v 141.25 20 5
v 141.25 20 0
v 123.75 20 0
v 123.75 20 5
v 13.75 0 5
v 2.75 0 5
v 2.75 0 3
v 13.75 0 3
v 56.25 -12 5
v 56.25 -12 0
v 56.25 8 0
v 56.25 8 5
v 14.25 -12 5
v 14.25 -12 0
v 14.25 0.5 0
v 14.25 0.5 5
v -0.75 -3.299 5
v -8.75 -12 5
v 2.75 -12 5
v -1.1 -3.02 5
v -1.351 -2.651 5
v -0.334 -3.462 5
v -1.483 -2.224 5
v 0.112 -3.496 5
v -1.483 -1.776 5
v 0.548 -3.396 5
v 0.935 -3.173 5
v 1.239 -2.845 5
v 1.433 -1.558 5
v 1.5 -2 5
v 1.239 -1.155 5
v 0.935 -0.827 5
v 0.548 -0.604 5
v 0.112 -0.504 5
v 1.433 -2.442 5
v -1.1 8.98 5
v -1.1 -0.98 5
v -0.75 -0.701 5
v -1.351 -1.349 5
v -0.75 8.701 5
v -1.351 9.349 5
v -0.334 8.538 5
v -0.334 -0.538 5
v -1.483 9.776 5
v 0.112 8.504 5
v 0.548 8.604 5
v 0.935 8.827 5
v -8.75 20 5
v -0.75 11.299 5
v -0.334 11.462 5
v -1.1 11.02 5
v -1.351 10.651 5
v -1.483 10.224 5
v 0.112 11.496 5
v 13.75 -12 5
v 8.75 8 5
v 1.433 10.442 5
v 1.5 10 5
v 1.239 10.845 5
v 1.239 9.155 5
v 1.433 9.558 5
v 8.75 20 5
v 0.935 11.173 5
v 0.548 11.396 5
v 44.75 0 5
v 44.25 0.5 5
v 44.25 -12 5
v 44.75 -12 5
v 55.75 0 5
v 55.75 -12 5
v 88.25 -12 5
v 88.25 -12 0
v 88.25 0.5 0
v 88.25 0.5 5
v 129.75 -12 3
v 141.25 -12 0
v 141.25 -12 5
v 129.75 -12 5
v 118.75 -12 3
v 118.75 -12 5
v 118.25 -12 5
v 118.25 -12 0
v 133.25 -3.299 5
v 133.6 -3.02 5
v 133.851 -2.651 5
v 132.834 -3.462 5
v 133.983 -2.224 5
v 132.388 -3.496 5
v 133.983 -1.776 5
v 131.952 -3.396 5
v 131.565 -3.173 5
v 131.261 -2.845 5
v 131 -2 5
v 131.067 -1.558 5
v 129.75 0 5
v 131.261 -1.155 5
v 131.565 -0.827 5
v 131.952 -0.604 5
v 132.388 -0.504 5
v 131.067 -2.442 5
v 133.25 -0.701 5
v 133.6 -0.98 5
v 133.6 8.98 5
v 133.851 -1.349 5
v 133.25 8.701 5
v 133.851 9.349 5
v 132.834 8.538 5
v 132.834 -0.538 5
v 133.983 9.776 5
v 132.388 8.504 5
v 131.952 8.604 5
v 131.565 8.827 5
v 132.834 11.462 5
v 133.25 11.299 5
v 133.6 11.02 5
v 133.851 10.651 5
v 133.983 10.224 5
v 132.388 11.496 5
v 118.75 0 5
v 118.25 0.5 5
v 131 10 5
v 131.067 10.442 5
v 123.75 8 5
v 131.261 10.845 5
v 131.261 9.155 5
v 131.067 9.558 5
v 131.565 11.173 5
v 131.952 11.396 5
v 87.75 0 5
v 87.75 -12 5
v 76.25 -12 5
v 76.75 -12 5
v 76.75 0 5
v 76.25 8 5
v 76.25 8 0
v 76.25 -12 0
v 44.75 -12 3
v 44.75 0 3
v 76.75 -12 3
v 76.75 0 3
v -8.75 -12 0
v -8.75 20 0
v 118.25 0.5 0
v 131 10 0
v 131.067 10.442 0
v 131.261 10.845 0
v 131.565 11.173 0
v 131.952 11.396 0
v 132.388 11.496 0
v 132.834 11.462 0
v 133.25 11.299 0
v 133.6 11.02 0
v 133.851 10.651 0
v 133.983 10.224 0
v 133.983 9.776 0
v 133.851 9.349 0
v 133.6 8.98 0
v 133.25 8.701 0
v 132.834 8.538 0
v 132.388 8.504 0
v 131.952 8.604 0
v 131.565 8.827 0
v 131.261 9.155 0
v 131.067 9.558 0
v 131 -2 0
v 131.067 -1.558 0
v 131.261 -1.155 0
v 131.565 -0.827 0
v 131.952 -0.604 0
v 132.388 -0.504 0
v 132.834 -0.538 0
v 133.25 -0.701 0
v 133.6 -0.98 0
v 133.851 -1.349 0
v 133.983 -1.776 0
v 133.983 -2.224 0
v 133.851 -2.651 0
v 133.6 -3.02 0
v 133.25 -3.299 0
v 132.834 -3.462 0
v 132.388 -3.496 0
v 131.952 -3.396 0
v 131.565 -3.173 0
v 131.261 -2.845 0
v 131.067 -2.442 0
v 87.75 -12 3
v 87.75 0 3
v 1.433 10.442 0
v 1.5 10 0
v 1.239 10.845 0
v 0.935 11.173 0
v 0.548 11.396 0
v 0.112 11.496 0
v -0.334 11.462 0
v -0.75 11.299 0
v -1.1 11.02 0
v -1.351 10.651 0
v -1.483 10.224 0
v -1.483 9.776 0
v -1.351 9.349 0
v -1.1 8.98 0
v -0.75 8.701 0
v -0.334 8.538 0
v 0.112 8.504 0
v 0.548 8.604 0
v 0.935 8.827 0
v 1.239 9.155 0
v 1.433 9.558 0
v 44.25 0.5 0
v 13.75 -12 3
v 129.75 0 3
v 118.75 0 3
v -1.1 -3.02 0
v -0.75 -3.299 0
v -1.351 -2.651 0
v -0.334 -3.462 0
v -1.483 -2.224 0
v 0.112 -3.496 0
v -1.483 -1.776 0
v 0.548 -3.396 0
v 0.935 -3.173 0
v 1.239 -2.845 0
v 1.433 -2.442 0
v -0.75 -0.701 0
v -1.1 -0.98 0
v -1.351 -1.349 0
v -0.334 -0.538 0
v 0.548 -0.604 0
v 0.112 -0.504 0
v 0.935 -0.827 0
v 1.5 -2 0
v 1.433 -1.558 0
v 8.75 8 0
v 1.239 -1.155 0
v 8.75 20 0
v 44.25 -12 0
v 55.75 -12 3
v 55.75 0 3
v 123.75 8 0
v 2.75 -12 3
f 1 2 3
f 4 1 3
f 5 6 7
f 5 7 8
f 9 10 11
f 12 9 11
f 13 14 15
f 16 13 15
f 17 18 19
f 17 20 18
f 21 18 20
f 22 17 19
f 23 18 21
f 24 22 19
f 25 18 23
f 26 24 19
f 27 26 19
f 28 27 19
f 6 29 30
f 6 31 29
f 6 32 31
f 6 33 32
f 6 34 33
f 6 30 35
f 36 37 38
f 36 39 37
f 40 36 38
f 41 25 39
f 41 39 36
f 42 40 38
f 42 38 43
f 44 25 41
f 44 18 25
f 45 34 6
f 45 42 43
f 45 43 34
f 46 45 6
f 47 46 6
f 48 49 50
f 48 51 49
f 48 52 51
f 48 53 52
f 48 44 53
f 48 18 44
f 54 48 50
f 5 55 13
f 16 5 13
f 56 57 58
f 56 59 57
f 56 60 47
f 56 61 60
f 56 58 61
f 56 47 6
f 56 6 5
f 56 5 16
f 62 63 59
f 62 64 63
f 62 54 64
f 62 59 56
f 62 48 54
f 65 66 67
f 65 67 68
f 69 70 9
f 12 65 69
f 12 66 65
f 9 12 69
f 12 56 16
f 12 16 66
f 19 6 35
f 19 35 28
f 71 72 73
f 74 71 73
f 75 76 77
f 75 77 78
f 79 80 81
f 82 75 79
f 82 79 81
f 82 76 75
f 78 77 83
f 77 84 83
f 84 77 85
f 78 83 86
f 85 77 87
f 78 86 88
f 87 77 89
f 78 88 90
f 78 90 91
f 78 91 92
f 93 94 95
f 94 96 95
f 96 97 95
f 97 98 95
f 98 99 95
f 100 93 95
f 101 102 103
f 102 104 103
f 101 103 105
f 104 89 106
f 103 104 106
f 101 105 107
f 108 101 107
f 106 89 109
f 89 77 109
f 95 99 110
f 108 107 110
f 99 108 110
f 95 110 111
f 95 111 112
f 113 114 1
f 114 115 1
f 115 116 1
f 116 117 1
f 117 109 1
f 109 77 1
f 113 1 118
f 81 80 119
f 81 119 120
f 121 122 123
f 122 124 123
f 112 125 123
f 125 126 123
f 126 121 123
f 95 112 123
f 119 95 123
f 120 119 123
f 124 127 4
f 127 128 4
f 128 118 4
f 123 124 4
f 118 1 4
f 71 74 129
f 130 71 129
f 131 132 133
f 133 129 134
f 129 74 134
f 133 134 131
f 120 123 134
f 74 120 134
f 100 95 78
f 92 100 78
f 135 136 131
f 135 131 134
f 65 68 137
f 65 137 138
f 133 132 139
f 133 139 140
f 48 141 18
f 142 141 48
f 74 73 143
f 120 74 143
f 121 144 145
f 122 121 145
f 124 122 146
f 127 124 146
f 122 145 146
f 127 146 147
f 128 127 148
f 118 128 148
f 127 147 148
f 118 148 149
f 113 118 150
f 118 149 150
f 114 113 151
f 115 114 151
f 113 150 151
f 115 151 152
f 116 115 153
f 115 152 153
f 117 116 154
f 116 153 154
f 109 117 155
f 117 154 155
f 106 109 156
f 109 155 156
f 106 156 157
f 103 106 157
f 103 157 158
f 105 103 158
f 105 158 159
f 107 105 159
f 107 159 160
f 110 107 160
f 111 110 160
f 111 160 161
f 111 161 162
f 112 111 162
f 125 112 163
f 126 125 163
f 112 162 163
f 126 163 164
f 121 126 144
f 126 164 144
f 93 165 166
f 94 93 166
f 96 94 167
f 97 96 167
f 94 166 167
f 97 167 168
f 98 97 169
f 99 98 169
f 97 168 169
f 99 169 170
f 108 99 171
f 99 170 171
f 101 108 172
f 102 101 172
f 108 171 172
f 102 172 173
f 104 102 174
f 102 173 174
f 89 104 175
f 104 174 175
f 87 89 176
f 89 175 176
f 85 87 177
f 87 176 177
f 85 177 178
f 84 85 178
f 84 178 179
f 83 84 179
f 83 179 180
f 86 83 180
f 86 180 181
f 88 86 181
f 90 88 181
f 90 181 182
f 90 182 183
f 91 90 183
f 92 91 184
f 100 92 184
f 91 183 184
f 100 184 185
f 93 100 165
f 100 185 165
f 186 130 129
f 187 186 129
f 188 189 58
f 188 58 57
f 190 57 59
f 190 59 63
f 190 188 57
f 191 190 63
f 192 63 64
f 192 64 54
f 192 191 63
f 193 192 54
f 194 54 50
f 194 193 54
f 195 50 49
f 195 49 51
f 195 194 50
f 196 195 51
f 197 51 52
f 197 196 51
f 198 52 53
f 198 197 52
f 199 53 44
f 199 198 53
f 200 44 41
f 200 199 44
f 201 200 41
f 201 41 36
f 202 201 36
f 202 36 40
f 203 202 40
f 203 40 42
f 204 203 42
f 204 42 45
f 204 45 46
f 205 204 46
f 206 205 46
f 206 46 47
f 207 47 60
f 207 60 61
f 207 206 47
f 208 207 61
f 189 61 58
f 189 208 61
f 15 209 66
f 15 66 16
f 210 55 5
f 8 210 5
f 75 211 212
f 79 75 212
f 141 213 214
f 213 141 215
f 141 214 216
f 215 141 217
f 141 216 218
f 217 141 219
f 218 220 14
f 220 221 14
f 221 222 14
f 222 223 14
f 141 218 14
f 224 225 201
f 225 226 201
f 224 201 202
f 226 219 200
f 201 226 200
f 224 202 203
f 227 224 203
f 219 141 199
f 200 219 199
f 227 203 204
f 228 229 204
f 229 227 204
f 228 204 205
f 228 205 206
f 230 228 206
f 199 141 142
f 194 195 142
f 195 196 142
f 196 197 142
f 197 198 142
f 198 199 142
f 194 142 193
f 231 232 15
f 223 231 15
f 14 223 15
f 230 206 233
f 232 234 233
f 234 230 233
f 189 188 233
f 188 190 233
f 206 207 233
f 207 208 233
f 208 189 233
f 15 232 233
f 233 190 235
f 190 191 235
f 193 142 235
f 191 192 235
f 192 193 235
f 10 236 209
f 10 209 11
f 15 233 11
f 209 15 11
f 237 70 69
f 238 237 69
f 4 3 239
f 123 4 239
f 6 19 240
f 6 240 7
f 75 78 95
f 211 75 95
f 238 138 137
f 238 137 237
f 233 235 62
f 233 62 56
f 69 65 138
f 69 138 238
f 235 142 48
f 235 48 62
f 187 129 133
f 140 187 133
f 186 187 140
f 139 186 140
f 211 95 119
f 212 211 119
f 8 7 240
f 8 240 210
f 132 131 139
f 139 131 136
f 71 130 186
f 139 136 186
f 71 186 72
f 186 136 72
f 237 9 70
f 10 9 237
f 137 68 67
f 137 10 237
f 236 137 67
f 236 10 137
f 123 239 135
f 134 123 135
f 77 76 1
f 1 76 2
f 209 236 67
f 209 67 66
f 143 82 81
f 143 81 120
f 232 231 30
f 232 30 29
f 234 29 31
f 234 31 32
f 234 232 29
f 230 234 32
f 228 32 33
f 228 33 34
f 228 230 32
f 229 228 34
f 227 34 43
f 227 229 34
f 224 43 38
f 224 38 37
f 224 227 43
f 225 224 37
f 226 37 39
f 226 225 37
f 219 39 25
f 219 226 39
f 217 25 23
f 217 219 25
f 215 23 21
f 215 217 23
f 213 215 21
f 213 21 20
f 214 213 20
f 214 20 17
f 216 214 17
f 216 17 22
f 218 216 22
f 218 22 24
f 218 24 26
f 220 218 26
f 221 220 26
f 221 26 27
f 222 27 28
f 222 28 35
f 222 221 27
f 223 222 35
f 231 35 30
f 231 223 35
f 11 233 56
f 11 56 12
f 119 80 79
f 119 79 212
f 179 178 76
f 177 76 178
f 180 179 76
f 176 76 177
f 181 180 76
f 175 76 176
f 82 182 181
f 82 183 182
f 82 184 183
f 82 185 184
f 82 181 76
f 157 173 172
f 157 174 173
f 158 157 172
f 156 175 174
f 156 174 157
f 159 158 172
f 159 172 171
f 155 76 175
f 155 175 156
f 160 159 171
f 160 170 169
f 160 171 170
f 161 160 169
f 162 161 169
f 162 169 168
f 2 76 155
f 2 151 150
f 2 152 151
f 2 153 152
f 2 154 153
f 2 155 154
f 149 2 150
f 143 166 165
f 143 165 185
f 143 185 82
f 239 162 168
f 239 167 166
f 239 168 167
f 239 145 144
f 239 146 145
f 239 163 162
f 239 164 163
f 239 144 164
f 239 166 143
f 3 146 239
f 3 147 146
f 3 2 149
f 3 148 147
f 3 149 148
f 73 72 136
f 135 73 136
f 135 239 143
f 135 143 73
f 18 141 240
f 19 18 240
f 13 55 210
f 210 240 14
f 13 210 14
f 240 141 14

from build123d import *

# Parameters (mm, degrees)
SKETCH1_R           = 1.5
BOSS_EXTRUDE1_DEPTH = 5
SKETCH2_W           = 11
SKETCH2_H           = 12
CUT_EXTRUDE1_DEPTH  = 2


with BuildPart() as part:
    # Sketch1 → Boss-Extrude1 (new body)
    with BuildSketch(Plane.XY):
        Polygon((56.25, 8), (8.75, 8), (8.75, 20), (-8.75, 20), (-8.75, -12), (14.25, -12), (14.25, 0.5), (44.25, 0.5), (44.25, -12), (56.25, -12), align=None)
        with Locations((0, -2)):
            Circle(SKETCH1_R, mode=Mode.SUBTRACT)
        with Locations((0, 10)):
            Circle(SKETCH1_R, mode=Mode.SUBTRACT)
    extrude(amount=BOSS_EXTRUDE1_DEPTH)

    # Sketch2 → Cut-Extrude1 (cut)
    with BuildSketch(Plane.XY.offset(5)):
        with Locations((50.25, -6)):
            Rectangle(SKETCH2_W, SKETCH2_H)
        with Locations((8.25, -6)):
            Rectangle(SKETCH2_W, SKETCH2_H)
    extrude(amount=-CUT_EXTRUDE1_DEPTH, mode=Mode.SUBTRACT)


with BuildPart() as body_2:
    # Mirror2: mirrored copy
    add(part.part.mirror(Plane(origin=(66.25, 0, 0), x_dir=(0, 0, 1), z_dir=(1, 0, 0))))


solid = Compound([part.part, body_2.part])
